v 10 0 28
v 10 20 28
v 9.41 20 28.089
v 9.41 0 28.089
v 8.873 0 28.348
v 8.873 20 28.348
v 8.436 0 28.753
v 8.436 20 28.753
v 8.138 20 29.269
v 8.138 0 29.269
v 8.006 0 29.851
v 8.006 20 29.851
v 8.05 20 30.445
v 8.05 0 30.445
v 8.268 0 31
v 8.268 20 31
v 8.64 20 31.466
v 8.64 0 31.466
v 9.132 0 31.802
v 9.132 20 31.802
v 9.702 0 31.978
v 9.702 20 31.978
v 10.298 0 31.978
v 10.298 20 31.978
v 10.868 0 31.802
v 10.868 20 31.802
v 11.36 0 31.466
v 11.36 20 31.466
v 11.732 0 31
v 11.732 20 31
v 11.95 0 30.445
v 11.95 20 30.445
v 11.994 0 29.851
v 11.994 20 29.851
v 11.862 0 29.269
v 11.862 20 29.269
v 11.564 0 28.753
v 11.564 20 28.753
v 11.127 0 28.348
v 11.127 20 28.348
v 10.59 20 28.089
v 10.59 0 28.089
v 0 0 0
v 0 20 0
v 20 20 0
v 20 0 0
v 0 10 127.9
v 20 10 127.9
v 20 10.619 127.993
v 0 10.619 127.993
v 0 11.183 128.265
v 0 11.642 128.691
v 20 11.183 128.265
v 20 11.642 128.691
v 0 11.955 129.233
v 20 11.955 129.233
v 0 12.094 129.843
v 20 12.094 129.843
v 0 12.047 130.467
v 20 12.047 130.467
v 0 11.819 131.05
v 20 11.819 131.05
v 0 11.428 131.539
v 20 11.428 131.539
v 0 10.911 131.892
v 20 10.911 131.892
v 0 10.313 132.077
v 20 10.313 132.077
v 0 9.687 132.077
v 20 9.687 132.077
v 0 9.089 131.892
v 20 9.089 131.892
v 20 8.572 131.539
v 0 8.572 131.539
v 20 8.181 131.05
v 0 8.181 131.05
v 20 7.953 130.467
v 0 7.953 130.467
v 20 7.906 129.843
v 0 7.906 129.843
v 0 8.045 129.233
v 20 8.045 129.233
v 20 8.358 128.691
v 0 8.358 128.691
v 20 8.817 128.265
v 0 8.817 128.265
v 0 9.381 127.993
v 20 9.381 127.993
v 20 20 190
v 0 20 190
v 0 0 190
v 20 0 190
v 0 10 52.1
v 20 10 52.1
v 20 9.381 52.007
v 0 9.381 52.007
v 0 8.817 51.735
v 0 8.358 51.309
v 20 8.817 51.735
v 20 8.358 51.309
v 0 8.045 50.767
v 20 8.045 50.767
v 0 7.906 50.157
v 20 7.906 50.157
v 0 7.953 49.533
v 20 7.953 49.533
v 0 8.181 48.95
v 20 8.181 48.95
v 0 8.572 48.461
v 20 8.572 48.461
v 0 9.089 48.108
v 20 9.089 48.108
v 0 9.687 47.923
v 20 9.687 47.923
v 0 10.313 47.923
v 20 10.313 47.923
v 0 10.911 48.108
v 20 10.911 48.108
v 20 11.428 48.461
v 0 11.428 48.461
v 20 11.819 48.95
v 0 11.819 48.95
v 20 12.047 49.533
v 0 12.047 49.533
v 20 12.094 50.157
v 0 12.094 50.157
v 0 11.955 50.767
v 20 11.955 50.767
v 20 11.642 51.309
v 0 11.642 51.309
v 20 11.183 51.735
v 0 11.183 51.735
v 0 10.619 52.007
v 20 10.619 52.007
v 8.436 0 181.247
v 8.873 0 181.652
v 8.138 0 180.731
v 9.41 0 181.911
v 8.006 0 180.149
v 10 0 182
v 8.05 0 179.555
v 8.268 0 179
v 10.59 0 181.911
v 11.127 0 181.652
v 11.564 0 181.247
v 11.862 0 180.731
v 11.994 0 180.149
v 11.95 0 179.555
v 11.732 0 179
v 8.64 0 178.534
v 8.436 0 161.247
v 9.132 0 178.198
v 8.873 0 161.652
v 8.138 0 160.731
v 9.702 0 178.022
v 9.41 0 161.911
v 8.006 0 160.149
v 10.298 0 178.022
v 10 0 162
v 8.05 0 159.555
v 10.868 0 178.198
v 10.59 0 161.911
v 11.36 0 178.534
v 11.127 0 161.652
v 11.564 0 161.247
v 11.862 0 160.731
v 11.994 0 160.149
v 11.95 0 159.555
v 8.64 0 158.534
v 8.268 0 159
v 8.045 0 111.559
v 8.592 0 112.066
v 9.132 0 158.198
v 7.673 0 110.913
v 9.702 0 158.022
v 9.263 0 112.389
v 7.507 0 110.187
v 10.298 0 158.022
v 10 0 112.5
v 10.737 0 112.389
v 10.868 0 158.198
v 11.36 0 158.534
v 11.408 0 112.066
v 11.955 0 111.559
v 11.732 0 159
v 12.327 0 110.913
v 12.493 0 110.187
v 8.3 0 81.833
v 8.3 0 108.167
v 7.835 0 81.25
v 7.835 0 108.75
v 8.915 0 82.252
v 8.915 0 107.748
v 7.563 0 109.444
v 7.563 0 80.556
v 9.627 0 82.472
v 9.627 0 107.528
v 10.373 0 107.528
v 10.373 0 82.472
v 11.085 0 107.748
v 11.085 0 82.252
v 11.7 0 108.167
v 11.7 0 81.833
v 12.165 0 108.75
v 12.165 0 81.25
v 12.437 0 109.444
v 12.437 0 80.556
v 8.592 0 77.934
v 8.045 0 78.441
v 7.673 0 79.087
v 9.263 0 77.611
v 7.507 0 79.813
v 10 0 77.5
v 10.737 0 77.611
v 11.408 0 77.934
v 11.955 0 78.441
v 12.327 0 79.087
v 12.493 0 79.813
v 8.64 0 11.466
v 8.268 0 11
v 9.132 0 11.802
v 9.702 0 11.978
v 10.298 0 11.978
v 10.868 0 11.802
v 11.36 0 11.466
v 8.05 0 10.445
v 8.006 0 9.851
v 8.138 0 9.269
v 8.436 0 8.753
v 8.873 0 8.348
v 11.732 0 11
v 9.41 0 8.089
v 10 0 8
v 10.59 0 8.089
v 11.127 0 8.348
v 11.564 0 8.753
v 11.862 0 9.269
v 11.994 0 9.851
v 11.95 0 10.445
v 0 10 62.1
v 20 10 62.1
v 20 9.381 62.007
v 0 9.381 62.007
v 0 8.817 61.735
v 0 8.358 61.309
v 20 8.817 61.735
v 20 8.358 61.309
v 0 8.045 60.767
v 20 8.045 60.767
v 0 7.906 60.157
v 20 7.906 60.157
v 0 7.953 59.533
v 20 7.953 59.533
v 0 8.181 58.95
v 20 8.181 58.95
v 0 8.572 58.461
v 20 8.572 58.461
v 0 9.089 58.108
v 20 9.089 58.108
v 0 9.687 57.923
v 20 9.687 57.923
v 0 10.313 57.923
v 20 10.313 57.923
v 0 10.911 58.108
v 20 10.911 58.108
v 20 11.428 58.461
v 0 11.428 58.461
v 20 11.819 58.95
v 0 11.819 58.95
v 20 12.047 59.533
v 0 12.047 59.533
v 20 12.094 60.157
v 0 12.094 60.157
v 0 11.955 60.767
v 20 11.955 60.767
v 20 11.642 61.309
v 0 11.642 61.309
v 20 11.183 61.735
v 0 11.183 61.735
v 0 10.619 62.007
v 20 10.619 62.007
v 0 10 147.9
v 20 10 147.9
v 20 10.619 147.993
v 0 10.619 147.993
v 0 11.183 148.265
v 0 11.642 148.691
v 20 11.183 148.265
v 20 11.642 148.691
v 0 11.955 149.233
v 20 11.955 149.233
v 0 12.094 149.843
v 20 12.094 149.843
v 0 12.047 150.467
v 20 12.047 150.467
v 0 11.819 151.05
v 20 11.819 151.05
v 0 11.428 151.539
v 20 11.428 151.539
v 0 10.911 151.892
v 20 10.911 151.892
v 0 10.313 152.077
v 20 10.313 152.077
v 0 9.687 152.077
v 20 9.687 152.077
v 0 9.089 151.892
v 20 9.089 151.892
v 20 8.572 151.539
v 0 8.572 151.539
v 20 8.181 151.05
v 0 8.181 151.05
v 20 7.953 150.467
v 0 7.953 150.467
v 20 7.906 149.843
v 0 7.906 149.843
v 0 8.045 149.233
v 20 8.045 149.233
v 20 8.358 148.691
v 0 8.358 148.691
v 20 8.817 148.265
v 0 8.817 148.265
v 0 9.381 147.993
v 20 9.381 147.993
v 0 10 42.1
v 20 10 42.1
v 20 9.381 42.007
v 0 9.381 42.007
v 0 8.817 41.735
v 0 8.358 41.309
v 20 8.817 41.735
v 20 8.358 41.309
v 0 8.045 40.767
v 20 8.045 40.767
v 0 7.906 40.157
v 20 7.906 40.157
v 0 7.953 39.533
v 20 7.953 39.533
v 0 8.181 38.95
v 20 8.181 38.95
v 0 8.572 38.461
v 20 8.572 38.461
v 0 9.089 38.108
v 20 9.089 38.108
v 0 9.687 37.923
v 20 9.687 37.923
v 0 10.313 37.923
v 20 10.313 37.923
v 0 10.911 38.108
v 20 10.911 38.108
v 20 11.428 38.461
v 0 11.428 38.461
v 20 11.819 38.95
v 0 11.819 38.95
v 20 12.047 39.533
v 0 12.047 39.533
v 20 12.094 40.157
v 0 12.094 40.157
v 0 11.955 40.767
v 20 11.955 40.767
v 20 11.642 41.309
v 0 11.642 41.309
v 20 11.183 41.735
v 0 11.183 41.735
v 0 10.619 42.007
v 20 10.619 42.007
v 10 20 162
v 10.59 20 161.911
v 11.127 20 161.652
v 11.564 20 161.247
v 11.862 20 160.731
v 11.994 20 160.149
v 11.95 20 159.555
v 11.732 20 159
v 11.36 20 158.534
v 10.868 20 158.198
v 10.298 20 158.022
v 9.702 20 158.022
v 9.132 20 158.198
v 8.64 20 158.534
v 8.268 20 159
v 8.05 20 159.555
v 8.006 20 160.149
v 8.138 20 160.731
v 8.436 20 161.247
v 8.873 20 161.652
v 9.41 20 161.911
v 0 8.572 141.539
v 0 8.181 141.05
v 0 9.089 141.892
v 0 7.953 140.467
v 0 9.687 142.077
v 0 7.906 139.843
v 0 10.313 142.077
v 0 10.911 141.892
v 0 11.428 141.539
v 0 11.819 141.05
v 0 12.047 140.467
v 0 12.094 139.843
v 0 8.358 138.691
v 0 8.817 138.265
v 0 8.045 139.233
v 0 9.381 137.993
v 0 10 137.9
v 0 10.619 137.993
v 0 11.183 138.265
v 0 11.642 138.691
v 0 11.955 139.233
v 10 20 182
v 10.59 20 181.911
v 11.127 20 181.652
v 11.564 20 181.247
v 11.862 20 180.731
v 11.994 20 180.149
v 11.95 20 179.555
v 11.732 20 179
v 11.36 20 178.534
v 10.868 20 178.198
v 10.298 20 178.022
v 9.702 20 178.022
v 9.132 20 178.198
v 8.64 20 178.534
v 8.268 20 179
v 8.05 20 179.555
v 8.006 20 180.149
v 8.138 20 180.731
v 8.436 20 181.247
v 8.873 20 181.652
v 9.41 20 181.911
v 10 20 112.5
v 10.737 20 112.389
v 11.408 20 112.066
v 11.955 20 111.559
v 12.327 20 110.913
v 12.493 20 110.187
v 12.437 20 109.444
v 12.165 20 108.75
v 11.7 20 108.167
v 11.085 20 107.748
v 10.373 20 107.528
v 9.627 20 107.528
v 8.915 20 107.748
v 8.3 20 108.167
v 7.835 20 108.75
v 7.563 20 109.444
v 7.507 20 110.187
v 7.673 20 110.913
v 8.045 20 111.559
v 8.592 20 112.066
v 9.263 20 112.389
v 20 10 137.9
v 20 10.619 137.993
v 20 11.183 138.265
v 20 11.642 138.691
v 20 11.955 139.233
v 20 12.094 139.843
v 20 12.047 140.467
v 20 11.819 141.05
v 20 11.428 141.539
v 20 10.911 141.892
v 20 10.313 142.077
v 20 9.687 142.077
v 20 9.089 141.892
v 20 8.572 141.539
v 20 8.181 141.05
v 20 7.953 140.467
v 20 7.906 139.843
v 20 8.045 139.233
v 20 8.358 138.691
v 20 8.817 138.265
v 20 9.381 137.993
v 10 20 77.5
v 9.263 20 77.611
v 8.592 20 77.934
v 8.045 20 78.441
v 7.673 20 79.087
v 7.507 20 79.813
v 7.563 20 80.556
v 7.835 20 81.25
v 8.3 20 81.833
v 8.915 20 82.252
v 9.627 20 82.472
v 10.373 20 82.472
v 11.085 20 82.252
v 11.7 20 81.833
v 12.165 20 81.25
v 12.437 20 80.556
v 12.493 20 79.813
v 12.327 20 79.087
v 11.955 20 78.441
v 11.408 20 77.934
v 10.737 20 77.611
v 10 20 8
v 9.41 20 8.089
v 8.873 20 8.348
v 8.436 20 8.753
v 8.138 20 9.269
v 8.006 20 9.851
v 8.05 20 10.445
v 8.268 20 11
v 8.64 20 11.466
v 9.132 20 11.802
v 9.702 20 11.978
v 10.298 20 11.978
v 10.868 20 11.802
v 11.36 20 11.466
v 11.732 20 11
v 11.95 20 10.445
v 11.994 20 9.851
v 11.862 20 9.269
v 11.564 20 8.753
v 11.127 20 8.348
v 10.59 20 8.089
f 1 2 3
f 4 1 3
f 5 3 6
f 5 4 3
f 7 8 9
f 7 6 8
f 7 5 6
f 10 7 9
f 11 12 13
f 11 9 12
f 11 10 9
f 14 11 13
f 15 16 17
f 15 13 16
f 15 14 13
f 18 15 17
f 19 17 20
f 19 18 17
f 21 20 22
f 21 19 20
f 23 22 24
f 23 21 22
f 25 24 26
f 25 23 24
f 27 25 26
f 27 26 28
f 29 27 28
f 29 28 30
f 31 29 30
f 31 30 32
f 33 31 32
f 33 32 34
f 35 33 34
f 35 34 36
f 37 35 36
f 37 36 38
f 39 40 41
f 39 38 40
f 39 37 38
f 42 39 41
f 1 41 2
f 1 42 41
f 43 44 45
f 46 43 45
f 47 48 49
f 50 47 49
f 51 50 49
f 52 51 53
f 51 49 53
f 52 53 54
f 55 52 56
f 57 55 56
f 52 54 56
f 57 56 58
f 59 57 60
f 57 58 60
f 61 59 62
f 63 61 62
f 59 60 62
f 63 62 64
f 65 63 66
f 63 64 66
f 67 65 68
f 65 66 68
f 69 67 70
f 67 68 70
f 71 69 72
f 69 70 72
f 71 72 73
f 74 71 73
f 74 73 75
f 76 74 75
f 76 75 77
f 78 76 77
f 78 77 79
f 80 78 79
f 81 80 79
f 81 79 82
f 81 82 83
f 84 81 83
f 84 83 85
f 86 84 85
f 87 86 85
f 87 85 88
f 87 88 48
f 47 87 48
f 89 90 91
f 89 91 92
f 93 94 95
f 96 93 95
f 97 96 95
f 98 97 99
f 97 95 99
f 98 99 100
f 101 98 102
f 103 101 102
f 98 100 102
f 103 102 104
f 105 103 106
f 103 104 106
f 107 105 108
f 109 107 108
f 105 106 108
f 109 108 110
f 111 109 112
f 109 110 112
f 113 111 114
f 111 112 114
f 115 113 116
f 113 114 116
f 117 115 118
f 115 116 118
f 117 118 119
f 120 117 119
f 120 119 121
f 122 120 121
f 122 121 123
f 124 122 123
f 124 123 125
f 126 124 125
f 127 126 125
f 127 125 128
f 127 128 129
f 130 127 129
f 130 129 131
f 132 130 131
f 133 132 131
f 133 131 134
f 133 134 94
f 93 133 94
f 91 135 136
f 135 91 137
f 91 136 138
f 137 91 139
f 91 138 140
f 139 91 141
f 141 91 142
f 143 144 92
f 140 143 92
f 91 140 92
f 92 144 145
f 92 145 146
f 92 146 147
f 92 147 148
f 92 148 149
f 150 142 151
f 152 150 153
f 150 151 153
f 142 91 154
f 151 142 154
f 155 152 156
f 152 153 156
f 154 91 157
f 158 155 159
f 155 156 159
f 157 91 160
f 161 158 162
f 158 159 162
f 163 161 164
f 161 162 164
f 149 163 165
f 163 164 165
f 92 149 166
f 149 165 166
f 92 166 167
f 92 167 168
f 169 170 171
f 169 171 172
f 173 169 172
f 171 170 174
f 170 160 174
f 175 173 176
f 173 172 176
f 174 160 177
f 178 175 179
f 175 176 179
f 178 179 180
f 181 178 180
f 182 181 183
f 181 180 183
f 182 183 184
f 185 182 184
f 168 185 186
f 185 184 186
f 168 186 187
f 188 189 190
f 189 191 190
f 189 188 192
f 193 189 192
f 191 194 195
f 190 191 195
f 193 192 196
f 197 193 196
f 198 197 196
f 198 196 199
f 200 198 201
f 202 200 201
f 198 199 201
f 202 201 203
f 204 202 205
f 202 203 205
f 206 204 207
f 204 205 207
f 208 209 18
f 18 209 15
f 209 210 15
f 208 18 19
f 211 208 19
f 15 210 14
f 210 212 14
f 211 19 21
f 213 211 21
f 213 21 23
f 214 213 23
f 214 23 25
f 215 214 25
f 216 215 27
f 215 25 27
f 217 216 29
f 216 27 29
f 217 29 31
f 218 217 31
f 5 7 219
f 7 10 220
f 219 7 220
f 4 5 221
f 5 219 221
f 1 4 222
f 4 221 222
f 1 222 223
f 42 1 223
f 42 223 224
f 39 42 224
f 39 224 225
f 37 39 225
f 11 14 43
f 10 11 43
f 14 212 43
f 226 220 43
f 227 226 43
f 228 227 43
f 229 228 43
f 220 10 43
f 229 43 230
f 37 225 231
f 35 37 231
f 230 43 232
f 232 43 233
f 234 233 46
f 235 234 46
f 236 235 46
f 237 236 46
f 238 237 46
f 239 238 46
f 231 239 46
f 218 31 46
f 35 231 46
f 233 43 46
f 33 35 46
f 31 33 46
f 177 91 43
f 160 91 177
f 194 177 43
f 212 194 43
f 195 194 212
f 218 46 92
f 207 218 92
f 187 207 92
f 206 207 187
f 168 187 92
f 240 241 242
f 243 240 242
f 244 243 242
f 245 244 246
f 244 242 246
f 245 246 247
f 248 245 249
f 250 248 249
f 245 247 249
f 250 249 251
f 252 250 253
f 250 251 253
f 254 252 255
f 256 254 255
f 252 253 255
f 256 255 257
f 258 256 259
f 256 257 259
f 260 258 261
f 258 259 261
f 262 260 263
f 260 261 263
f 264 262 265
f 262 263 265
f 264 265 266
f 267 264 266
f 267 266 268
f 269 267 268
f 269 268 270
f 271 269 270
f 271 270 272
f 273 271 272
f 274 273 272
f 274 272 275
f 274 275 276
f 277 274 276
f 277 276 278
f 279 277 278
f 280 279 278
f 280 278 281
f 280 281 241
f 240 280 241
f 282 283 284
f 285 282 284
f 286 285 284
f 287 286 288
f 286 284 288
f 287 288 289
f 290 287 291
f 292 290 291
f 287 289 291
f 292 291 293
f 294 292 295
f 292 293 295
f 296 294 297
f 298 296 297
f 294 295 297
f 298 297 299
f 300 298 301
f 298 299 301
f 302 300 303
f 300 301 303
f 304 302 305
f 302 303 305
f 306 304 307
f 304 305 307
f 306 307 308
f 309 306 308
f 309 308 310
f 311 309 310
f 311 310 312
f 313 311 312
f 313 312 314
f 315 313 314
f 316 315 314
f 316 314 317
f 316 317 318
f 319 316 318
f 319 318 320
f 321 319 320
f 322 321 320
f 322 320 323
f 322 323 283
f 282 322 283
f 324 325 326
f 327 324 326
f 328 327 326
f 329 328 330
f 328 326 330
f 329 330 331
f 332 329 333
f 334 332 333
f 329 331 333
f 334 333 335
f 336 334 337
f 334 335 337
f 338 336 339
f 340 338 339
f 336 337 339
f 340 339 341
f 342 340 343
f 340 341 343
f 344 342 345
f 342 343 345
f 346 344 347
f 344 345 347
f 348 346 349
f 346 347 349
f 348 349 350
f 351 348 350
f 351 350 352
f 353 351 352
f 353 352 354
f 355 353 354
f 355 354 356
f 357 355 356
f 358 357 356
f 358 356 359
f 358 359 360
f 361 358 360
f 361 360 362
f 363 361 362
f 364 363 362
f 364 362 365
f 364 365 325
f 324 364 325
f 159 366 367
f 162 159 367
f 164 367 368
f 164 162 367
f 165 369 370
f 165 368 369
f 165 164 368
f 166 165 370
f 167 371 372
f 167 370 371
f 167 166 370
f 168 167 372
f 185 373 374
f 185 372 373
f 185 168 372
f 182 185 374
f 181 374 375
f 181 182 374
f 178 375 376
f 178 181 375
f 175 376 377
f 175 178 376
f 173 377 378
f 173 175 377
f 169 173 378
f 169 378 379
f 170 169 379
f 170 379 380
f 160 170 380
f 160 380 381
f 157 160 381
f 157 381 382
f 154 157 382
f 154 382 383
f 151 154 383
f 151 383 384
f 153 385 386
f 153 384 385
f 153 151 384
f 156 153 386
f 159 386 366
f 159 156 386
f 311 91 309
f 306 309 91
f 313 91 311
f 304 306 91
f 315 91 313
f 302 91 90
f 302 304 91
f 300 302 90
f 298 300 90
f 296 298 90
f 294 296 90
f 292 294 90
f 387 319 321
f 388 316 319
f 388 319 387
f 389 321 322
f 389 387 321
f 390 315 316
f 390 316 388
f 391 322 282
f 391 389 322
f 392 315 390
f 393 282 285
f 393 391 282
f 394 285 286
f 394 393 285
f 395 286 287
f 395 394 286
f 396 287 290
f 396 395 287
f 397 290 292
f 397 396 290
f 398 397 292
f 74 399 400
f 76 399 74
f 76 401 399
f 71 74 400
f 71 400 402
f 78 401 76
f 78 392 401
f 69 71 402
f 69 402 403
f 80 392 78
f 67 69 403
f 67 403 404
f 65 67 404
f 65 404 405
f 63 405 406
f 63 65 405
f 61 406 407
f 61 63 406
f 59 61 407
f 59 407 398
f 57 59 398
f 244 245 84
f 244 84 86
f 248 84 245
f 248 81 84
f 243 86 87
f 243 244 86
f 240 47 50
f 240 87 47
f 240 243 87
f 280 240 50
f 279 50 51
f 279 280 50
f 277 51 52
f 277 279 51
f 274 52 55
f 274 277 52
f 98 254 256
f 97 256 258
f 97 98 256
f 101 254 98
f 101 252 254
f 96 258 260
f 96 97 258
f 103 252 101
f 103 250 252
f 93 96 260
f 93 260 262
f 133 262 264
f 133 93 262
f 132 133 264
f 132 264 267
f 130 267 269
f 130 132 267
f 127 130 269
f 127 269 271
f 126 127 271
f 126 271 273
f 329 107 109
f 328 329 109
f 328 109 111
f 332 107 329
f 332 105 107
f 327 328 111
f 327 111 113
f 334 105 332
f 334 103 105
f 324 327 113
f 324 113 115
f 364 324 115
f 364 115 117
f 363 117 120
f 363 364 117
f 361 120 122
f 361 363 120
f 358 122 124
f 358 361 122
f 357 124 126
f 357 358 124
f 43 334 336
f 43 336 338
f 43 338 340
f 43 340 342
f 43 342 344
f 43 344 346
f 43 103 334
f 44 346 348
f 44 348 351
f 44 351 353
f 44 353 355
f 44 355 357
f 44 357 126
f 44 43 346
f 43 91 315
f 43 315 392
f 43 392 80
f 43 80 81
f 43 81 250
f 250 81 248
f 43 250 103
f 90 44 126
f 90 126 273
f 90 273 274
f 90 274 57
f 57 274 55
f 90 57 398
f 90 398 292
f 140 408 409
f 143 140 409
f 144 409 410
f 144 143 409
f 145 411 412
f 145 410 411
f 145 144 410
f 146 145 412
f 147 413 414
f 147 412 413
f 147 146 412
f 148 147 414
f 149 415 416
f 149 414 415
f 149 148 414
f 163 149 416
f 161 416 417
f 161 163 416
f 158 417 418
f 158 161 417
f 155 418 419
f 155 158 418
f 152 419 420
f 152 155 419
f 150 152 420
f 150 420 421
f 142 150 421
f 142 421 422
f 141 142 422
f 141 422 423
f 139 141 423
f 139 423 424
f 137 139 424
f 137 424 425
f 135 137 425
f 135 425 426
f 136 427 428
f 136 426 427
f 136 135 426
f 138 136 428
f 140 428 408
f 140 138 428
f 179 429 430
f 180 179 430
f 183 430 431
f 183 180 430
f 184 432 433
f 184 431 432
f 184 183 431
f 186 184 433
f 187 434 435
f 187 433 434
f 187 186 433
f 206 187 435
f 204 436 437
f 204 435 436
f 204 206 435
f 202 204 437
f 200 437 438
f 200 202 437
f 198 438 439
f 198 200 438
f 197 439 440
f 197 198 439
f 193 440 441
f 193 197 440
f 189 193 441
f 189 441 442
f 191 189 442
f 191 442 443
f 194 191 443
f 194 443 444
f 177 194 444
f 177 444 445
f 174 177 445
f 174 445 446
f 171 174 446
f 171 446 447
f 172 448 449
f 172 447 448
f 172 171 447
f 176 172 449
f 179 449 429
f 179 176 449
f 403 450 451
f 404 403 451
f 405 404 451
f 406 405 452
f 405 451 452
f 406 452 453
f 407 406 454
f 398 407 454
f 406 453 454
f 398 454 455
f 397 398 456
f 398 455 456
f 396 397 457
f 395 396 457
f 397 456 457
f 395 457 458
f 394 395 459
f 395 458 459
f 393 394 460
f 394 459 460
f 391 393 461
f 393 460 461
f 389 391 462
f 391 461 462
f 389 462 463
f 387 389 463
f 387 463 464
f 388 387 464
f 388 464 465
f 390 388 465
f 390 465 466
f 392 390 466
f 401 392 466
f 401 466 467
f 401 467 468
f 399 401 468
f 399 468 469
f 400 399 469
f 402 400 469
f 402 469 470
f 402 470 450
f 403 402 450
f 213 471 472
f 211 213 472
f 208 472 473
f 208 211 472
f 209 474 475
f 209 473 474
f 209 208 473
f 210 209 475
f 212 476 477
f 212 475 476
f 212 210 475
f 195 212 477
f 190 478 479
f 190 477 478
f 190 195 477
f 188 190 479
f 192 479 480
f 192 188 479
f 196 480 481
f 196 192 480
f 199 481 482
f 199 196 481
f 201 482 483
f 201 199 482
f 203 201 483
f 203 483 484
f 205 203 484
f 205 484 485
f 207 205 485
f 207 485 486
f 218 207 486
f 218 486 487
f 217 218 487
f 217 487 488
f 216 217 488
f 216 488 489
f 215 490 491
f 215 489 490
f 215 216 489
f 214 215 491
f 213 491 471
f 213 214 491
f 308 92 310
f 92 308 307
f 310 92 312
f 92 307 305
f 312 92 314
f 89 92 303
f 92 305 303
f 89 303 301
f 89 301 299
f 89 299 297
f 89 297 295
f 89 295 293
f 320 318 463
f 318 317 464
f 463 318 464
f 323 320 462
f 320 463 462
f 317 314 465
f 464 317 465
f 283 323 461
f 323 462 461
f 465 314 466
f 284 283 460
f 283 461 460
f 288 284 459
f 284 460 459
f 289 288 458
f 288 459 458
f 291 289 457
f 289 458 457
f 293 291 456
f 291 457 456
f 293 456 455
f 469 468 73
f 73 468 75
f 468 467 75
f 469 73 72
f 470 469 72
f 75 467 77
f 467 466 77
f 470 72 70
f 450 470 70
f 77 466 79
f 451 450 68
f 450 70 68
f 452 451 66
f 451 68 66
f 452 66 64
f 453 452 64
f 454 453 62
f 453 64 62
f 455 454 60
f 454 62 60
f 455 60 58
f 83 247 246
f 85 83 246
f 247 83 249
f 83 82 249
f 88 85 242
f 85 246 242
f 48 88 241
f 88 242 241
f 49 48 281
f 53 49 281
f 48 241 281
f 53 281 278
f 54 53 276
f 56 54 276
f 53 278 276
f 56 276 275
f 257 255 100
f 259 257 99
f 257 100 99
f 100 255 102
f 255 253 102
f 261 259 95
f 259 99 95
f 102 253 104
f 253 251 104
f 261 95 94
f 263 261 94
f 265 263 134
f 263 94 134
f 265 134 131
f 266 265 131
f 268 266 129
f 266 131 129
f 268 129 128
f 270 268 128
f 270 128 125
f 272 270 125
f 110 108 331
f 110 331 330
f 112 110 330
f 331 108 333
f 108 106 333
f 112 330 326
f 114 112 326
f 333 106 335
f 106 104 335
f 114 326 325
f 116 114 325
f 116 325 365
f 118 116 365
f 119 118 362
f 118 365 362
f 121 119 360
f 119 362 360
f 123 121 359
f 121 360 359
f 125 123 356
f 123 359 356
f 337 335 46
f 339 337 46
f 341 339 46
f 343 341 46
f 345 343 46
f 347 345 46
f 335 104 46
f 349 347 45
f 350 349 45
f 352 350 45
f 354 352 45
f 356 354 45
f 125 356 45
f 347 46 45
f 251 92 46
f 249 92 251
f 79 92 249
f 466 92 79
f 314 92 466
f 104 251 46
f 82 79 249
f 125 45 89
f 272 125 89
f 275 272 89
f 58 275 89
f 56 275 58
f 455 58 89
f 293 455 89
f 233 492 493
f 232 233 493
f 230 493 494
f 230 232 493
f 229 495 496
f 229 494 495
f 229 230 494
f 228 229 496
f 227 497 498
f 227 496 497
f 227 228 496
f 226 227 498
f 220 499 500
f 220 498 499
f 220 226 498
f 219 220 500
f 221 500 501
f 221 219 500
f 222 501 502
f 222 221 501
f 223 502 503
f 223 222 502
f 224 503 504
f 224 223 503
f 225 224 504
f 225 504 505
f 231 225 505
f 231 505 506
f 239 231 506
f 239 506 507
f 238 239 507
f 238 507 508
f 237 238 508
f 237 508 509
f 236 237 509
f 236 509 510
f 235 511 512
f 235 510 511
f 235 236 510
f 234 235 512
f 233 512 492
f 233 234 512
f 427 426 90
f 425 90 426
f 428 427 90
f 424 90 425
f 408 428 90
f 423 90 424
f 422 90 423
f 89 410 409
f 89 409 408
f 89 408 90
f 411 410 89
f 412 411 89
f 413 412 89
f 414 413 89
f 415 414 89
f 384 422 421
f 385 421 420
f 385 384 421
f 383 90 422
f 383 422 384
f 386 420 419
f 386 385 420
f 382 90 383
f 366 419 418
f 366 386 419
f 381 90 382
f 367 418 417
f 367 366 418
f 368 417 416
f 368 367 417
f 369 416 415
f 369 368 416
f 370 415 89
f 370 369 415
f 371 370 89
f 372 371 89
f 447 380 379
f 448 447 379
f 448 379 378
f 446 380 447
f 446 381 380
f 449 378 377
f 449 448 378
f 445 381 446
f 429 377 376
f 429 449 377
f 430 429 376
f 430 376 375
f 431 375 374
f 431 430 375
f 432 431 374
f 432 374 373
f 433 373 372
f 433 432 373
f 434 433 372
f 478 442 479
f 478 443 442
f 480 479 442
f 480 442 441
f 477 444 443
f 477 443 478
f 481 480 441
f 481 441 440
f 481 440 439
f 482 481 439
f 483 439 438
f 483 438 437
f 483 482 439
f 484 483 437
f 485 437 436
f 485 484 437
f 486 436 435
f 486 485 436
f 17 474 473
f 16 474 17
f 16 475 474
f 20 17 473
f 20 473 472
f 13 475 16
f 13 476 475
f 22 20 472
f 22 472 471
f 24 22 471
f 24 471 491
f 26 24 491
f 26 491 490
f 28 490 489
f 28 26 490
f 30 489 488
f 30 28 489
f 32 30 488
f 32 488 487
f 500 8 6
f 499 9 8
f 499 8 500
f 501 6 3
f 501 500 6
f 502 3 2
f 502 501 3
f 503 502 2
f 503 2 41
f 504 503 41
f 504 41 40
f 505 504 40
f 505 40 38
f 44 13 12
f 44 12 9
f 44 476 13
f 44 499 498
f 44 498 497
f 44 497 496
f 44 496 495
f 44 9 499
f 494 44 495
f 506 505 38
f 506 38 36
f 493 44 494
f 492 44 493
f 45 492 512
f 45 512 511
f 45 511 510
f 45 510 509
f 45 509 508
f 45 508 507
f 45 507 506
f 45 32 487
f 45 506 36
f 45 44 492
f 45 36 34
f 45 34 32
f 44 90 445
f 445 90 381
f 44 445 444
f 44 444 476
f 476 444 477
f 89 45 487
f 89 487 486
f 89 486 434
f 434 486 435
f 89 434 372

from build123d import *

# Parameters (mm, degrees)
SKETCH_1_W               = 20
SKETCH_1_H               = 20
EXTRUDE_1_DEPTH          = 190
CUT_EXTRUDE_1_DEPTH      = 193.093727123
CUT_EXTRUDE_1_DEPTH_BACK = 193.093727123
SKETCH_2_R               = 2
SKETCH_2_R_2             = 2.5
SKETCH_3_R               = 2.1
CUT_EXTRUDE_2_DEPTH      = 193.093727123


with BuildPart() as part:
    # 草图1 → 凸台-拉伸1 (new body)
    with BuildSketch(Plane.XY):
        with Locations((10, 10)):
            Rectangle(SKETCH_1_W, SKETCH_1_H)
    extrude(amount=EXTRUDE_1_DEPTH)

    # 草图2 → 切除-拉伸1 (cut, two sides: drawn at the far end of the back side and taken through both)
    with BuildSketch(Plane(origin=(0, 20, 0), x_dir=(1, 0, 0), z_dir=(0, 1, 0)).offset(-CUT_EXTRUDE_1_DEPTH_BACK)):
        with Locations(Location((10, -180, 0), (0, 0, 270))):
            Circle(SKETCH_2_R)
        with Locations(Location((10, -160, 0), (0, 0, 270))):
            Circle(SKETCH_2_R)
        with Locations(Location((10, -110, 0), (0, 0, 270))):
            Circle(SKETCH_2_R_2)
        with Locations(Location((10, -10, 0), (0, 0, 90))):
            Circle(SKETCH_2_R)
        with Locations(Location((10, -30, 0), (0, 0, 90))):
            Circle(SKETCH_2_R)
        with Locations(Location((10, -80, 0), (0, 0, 90))):
            Circle(SKETCH_2_R_2)
    extrude(amount=CUT_EXTRUDE_1_DEPTH + CUT_EXTRUDE_1_DEPTH_BACK, mode=Mode.SUBTRACT)

    # 草图3 → 切除-拉伸2 (cut, through all)
    with BuildSketch(Plane(origin=(20, 0, 0), x_dir=(0, 0, -1), z_dir=(1, 0, 0))):
        with Locations((-140, 10)):
            Circle(SKETCH_3_R)
        with Locations((-130, 10)):
            Circle(SKETCH_3_R)
        with Locations((-150, 10)):
            Circle(SKETCH_3_R)
        with Locations(Location((-60, 10, 0), (0, 0, 180))):
            Circle(SKETCH_3_R)
        with Locations(Location((-50, 10, 0), (0, 0, 180))):
            Circle(SKETCH_3_R)
        with Locations(Location((-40, 10, 0), (0, 0, 180))):
            Circle(SKETCH_3_R)
    extrude(amount=-CUT_EXTRUDE_2_DEPTH, mode=Mode.SUBTRACT)


solid = part.part
